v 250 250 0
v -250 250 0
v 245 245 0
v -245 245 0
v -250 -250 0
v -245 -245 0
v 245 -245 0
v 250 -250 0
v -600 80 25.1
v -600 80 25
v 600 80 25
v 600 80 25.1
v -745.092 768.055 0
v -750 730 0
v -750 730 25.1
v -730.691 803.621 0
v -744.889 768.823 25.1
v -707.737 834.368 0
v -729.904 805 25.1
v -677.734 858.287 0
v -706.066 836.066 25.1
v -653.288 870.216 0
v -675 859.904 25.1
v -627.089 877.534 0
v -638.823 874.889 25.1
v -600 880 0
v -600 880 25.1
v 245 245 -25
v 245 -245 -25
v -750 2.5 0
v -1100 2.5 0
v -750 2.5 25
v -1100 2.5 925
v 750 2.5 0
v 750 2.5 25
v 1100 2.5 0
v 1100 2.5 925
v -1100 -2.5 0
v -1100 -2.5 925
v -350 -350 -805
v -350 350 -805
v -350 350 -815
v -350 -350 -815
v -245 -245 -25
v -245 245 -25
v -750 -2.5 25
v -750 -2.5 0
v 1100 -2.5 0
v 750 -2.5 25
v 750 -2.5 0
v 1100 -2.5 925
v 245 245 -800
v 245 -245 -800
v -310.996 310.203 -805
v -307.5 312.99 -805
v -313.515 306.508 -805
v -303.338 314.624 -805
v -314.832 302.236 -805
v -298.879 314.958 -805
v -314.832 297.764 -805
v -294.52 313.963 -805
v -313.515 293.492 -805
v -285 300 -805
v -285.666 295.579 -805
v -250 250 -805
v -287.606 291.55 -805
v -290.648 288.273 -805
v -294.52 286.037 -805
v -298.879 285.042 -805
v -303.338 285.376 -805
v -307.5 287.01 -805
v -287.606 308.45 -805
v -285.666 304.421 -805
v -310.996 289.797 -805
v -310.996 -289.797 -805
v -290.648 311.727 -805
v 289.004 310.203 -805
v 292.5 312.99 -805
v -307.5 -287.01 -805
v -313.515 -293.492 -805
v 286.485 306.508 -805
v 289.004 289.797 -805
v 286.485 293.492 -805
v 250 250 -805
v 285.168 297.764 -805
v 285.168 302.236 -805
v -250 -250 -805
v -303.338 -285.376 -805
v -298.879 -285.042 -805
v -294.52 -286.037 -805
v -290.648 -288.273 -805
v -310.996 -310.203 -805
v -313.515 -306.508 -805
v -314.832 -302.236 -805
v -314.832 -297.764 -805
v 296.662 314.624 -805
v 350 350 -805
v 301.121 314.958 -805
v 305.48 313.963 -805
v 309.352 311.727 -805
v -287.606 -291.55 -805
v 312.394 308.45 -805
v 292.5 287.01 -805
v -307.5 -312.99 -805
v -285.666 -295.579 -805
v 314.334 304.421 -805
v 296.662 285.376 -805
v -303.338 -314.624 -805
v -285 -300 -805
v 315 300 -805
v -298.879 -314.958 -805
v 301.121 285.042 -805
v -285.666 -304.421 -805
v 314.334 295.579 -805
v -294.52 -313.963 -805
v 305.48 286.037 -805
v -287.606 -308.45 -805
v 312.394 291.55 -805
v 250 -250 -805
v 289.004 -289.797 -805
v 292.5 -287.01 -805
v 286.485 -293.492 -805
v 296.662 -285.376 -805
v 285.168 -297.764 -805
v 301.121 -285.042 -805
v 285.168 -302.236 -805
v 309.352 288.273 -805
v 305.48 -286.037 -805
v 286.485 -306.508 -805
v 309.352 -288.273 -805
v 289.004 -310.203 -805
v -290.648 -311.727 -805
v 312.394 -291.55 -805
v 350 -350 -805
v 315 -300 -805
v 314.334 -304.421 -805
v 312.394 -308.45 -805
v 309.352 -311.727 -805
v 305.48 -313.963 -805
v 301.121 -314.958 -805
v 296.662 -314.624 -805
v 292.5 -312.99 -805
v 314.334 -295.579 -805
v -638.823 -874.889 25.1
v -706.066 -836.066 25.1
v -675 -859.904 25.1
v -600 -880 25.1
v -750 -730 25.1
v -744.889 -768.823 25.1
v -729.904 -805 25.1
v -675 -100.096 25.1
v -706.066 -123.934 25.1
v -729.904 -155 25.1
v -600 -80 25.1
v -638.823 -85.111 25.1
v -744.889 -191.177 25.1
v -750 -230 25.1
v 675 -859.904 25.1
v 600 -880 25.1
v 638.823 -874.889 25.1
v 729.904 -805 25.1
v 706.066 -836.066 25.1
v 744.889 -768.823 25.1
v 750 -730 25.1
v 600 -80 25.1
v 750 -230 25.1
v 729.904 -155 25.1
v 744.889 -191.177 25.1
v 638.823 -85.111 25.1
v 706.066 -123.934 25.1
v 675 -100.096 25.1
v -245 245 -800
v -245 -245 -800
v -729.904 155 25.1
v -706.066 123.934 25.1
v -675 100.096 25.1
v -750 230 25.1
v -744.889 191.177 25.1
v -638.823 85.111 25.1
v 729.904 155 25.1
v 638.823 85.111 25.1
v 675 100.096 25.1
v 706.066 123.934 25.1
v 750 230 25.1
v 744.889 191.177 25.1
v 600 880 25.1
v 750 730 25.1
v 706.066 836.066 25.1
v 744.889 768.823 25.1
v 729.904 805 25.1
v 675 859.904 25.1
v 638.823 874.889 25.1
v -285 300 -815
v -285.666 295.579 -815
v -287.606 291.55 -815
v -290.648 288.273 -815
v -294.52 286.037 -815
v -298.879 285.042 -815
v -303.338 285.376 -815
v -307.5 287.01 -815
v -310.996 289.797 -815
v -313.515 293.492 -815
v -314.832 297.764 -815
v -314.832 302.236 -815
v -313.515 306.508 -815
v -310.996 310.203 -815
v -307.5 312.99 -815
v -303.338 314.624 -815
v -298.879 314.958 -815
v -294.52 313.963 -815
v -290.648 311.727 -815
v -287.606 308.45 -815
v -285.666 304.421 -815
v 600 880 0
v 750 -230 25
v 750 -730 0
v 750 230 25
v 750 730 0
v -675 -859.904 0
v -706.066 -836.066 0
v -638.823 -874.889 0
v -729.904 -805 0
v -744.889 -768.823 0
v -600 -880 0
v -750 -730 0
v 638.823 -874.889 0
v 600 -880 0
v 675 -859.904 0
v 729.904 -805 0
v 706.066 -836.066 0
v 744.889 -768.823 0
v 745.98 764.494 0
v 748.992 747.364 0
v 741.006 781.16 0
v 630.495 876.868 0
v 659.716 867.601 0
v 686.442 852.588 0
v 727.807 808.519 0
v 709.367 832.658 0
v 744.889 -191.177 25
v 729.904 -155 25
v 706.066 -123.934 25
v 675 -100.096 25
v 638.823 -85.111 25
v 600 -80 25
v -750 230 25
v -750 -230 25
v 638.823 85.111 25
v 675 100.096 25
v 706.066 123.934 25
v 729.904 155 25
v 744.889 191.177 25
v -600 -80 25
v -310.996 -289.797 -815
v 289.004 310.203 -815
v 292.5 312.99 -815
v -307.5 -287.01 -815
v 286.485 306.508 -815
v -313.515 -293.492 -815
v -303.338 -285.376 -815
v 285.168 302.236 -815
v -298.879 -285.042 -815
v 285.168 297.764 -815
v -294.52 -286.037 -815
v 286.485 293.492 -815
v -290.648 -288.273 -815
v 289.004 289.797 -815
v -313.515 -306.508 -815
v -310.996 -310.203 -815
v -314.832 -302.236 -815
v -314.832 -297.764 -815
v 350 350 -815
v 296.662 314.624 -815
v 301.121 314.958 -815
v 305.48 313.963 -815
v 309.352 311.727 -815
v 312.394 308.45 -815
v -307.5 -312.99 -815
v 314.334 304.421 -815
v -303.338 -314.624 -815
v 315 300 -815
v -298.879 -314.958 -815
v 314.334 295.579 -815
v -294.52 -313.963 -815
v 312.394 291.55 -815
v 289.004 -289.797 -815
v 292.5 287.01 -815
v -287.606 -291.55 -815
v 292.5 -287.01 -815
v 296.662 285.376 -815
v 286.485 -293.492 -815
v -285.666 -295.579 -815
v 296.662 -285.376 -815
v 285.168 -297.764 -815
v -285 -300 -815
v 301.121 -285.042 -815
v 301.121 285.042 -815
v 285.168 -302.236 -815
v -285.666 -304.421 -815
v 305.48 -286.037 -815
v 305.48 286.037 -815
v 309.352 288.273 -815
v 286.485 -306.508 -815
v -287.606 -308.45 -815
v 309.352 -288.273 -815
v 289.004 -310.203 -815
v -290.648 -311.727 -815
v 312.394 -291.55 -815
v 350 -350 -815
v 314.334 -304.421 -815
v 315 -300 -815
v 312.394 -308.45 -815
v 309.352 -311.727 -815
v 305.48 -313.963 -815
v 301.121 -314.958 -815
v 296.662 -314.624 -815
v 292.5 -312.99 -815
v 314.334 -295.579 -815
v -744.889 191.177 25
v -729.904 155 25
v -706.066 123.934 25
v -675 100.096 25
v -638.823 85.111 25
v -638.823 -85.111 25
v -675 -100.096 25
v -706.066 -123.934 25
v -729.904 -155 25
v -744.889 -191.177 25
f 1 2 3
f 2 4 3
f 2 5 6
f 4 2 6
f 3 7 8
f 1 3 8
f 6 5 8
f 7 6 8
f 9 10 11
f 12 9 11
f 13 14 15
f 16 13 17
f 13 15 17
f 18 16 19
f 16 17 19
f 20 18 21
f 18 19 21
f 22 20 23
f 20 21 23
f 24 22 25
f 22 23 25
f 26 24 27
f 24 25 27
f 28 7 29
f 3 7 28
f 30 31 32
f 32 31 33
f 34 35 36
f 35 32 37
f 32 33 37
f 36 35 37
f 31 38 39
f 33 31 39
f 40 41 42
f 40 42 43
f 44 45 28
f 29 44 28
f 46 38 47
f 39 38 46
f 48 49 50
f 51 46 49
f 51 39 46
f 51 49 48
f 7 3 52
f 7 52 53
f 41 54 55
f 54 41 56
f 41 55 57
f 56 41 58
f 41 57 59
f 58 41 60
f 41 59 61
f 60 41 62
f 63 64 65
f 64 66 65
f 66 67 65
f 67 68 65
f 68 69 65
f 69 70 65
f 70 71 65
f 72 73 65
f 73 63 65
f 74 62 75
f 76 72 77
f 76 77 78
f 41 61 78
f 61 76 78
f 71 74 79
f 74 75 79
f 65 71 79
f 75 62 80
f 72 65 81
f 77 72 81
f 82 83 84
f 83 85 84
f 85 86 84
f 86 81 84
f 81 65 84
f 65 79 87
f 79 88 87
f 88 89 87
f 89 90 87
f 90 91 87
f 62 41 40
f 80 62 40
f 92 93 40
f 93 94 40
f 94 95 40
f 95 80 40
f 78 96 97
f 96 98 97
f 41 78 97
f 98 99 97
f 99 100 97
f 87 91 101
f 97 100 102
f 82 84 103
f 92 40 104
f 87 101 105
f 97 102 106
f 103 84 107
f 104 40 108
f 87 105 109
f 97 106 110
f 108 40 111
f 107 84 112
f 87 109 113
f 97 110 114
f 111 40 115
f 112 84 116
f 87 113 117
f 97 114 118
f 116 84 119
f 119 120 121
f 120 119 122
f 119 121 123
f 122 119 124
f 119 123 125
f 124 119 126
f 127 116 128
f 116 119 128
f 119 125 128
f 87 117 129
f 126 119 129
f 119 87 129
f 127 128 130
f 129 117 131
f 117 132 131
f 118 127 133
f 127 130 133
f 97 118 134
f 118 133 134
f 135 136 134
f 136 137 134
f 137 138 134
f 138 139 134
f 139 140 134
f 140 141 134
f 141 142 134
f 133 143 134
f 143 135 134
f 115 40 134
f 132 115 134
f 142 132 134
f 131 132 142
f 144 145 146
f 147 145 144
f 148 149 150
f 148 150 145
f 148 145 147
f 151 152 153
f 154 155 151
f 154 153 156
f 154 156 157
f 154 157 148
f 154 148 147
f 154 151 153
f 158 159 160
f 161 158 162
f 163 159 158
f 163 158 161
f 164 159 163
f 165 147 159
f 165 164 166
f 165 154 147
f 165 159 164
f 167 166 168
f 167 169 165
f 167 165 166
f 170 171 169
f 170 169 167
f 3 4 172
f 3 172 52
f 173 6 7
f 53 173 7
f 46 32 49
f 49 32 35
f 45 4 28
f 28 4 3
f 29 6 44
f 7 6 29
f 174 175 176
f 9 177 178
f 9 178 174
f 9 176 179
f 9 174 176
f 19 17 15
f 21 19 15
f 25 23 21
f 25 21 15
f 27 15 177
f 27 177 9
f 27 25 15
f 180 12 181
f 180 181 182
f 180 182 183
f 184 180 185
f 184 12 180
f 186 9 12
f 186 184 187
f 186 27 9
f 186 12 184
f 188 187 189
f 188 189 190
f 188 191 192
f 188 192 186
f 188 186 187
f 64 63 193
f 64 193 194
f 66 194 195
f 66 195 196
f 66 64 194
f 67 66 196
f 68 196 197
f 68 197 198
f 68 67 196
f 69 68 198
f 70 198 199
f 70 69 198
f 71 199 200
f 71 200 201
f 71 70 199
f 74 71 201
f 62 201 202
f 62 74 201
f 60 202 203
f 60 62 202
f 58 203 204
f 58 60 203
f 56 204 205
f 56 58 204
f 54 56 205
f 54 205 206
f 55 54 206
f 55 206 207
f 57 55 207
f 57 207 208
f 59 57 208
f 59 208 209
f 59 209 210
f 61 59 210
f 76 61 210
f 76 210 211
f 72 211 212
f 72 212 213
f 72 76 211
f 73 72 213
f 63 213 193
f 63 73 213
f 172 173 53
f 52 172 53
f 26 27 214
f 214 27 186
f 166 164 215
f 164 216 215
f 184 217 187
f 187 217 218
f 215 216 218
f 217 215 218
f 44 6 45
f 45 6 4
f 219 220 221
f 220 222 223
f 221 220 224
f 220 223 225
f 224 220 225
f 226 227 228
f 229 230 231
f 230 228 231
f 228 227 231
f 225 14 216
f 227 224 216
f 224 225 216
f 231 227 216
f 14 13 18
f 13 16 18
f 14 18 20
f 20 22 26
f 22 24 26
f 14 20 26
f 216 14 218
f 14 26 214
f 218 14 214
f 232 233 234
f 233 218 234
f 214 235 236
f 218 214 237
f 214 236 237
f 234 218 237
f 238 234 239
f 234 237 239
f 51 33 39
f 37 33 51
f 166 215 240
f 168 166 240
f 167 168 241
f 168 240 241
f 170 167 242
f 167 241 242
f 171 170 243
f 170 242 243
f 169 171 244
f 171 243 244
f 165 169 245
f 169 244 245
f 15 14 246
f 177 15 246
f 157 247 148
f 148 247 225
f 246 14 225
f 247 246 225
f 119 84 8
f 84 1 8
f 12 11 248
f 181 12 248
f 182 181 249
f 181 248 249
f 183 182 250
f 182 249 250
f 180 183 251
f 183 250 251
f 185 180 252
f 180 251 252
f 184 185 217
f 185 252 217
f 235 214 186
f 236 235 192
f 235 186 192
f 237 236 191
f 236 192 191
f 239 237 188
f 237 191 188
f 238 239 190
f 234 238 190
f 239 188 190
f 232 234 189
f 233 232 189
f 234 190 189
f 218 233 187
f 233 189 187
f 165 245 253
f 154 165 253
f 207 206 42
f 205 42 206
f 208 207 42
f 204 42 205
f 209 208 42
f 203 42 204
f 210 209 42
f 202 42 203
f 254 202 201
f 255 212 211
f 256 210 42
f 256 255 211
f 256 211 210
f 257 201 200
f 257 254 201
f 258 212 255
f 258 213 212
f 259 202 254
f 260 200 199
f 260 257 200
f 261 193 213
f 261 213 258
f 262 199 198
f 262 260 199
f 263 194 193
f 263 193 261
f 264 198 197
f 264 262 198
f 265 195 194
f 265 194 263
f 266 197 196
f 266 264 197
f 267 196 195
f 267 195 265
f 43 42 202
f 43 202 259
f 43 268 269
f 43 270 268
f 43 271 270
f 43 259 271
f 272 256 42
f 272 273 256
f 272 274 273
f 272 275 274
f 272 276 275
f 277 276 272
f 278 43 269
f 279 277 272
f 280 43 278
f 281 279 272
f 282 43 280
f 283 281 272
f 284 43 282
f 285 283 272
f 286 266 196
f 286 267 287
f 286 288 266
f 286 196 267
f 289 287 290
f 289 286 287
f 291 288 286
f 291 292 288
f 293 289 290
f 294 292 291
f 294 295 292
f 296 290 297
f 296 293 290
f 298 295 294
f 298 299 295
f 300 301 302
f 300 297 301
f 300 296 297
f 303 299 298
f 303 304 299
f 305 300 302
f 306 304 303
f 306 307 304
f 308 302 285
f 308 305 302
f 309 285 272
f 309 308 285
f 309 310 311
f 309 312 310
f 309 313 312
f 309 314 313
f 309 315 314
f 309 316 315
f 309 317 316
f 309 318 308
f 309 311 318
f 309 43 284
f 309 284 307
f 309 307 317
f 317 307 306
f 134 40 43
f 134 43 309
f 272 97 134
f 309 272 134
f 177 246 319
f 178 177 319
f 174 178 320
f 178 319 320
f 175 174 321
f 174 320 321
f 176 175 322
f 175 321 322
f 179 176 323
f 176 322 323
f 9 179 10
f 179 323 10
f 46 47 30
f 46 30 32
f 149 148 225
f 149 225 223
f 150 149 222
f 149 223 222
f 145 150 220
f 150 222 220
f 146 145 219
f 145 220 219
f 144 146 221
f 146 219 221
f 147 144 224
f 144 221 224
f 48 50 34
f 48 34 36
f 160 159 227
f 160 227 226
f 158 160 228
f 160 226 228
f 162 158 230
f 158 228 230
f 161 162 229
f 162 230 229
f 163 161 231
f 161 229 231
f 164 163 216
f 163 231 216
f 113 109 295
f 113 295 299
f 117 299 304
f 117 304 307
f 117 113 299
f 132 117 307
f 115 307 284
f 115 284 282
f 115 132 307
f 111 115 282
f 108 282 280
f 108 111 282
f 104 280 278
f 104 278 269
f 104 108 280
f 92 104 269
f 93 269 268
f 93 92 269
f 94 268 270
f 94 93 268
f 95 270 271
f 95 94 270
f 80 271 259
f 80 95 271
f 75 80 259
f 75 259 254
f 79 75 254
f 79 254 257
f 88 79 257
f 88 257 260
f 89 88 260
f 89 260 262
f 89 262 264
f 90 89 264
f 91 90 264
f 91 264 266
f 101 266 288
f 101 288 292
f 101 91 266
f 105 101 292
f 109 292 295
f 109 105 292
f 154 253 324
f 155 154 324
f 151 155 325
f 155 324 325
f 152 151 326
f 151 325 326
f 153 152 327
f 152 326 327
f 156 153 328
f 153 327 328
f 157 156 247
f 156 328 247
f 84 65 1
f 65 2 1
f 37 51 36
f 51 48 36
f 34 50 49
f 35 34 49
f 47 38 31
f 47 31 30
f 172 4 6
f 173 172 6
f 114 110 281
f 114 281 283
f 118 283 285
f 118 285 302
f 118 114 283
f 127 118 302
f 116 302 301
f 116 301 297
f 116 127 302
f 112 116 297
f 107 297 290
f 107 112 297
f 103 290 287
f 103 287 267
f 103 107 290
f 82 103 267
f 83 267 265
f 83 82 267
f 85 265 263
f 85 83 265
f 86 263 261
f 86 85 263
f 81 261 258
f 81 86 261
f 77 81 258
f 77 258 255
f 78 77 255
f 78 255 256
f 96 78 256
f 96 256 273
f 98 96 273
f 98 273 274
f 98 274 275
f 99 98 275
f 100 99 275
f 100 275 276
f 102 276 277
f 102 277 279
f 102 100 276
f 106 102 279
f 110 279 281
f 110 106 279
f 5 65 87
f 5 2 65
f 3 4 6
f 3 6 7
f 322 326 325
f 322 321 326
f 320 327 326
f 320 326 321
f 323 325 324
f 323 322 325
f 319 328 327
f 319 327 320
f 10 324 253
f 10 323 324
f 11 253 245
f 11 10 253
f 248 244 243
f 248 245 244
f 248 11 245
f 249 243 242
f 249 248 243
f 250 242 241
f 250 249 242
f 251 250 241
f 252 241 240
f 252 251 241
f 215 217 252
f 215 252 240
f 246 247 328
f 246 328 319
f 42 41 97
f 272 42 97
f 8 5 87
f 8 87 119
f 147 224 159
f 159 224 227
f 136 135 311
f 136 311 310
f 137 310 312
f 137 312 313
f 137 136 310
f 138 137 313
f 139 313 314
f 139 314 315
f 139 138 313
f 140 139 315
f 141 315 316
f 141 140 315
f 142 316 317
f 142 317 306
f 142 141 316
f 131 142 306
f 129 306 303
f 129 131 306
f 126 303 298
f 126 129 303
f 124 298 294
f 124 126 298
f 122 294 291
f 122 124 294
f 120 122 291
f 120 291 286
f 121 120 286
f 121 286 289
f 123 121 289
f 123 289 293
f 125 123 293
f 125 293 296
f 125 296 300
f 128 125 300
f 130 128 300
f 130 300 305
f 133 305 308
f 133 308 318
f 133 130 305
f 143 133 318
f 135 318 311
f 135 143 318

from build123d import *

# Parameters (mm, degrees)
F0_R      = 1250
F1_DEPTH  = 25
F3_DEPTH  = 0.1
F4_W      = 500
F4_H      = 500
F4_W_2    = 490
F4_H_2    = 490
F5_DEPTH  = 800
F6_W      = 2200
F6_H      = 5
F7_DEPTH  = 900
F8_W      = 500
F8_H      = 500
F9_DEPTH  = 5
F10_W     = 700
F10_H     = 700
F10_R     = 15
F11_DEPTH = 10
F13_DEPTH = 30
F15_DEPTH = 30
F16_W     = 490
F16_H     = 490
F17_DEPTH = 25
F18_R     = 350
F20_DEPTH = 25
F21_W     = 350
F21_H     = 25
F22_DEPTH = 5


# Not quite as in the source:
# - a feature names something its author has since deleted; it is built from what else it names


with BuildPart() as f1:
    # F0 (on Top) → F1 (new body)
    with BuildSketch(Plane.XY):
        Circle(F0_R)
    extrude(amount=F1_DEPTH)

    # F2 (on face) → F3 (join)
    with BuildSketch(Plane.XY.offset(25)):
        with BuildLine():
            Line((-600, 80), (600, 80))
            ThreePointArc((600, 80), (706.066017178, 123.933982822), (750, 230))
            Line((750, 230), (750, 730))
            ThreePointArc((750, 730), (706.066017178, 836.066017178), (600, 880))
            Line((600, 880), (-600, 880))
            ThreePointArc((-600, 880), (-706.066017178, 836.066017178), (-750, 730))
            Line((-750, 730), (-750, 230))
            ThreePointArc((-750, 230), (-706.066017178, 123.933982822), (-600, 80))
        make_face()
        with BuildLine():
            ThreePointArc((-600, -80), (-706.066017178, -123.933982822), (-750, -230))
            Line((-750, -230), (-750, -730))
            ThreePointArc((-750, -730), (-706.066017178, -836.066017178), (-600, -880))
            Line((-600, -880), (600, -880))
            ThreePointArc((600, -880), (706.066017178, -836.066017178), (750, -730))
            Line((750, -730), (750, -230))
            ThreePointArc((750, -230), (706.066017178, -123.933982822), (600, -80))
            Line((600, -80), (-600, -80))
        make_face()
    extrude(amount=F3_DEPTH)

    # F12 (on face) → F13 (cut)
    with BuildSketch(Plane.XY.offset(25)):
        with BuildLine():
            ThreePointArc((835.2245207129, -930), (0, -1250), (-835.2245207129, -930))
            Line((-835.2245207129, -930), (-1254.9974999975, -930))
            Line((-1254.9974999975, -930), (-1254.9974999975, -1430))
            Line((-1254.9974999975, -1430), (1245.0025000025, -1430))
            Line((1245.0025000025, -1430), (1245.0025000025, -930))
            Line((1245.0025000025, -930), (835.2245207129, -930))
        make_face()
        with BuildLine():
            Line((-835.2245207129, 930), (835.2245207129, 930))
            ThreePointArc((835.2245207129, 930), (0, 1250), (-835.2245207129, 930))
        make_face()
        with BuildLine():
            Line((835.2245207129, -930), (-835.2245207129, -930))
            ThreePointArc((-835.2245207129, -930), (0, -1250), (835.2245207129, -930))
        make_face()
    extrude(amount=-F13_DEPTH, mode=Mode.SUBTRACT)

    # F14 (on face) → F15 (cut)
    with BuildSketch(Plane.XY.offset(25)):
        Polygon((835.2245207128, 930), (835.2245207128, -930), (1324.2889336484, -826), (1324.2889336484, 930), align=None)
        Polygon((-1324.2889336484, -826), (-835.2245207128, -930), (-835.2245207128, 930), (-1324.2889336484, 930), align=None)
    extrude(amount=-F15_DEPTH, mode=Mode.SUBTRACT)

    # F18
    f18_edges = [f1.edges().sort_by_distance(p)[0] for p in [
        (-835.224521, 930, 12.5),
        (-835.224521, -930, 12.5),
        (835.224521, -930, 12.5),
        (835.224521, 930, 12.5),
    ]]
    fillet(f18_edges, radius=F18_R)

    # F19 (on face) → F20 (cut)
    with BuildSketch(Plane.XY.offset(25)):
        with BuildLine():
            Line((-750, 230), (-750, 730))
            ThreePointArc((-750, 730), (-730.6905446057, 803.6205239771), (-677.7335793245, 858.2867516363))
            Line((-677.7335793245, 858.2867516363), (-665.502084486, 880))
            ThreePointArc((-665.502084486, 880), (-789.8531038437, 752.3410175776), (-835.2245207128, 580))
            Line((-835.2245207128, 580), (-835.2245207128, -580))
            ThreePointArc((-835.2245207128, -580), (-813.2271256953, -702.1240808553), (-750, -808.8972380092))
            Line((-750, -808.8972380092), (-750, -730))
            Line((-750, -730), (-750, -230))
            Line((-750, -230), (-750, 230))
        make_face()
        with BuildLine():
            Line((-665.502084486, 880), (-677.7335793245, 858.2867516363))
            ThreePointArc((-677.7335793245, 858.2867516363), (-640.3545985889, 874.4697420664), (-600, 880))
            Line((-600, 880), (-665.502084486, 880))
        make_face()
        with BuildLine():
            ThreePointArc((-485.2245207128, 930), (-578.7659553822, 917.2684390808), (-665.502084486, 880))
            Line((-665.502084486, 880), (-600, 880))
            Line((-600, 880), (600, 880))
            Line((600, 880), (665.502084486, 880))
            ThreePointArc((665.502084486, 880), (578.7659553822, 917.2684390808), (485.2245207128, 930))
            Line((485.2245207128, 930), (-485.2245207128, 930))
        make_face()
        with BuildLine():
            ThreePointArc((-600, -880), (-706.066017178, -836.066017178), (-750, -730))
            Line((-750, -730), (-750, -808.8972380092))
            ThreePointArc((-750, -808.8972380092), (-710.5730362948, -847.8022526511), (-665.5020844861, -880))
            Line((-665.5020844861, -880), (-600, -880))
        make_face()
        with BuildLine():
            Line((665.502084486, 880), (600, 880))
            ThreePointArc((600, 880), (645.3424208849, 872.9827432535), (686.4424496518, 852.5875315772))
            Line((686.4424496518, 852.5875315772), (665.502084486, 880))
        make_face()
        with BuildLine():
            Line((600, -880), (-600, -880))
            Line((-600, -880), (-665.5020844861, -880))
            ThreePointArc((-665.5020844861, -880), (-578.7659553822, -917.2684390808), (-485.2245207128, -930))
            Line((-485.2245207128, -930), (485.2245207128, -930))
            ThreePointArc((485.2245207128, -930), (578.7659553822, -917.2684390808), (665.5020844861, -880))
            Line((665.5020844861, -880), (600, -880))
        make_face()
        with BuildLine():
            Line((750, 730), (750, 230))
            Line((750, 230), (750, -230))
            Line((750, -230), (750, -730))
            Line((750, -730), (750, -808.8972380092))
            ThreePointArc((750, -808.8972380092), (813.2271256953, -702.1240808553), (835.2245207128, -580))
            Line((835.2245207128, -580), (835.2245207128, 580))
            ThreePointArc((835.2245207128, 580), (789.8531038437, 752.3410175776), (665.502084486, 880))
            Line((665.502084486, 880), (686.4424496518, 852.5875315772))
            ThreePointArc((686.4424496518, 852.5875315772), (719.2000530228, 821.0568358739), (741.0058450449, 781.1600592569))
            Line((741.0058450449, 781.1600592569), (750, 769.3860530853))
            Line((750, 769.3860530853), (750, 730))
        make_face()
        with BuildLine():
            ThreePointArc((750, -730), (706.066017178, -836.066017178), (600, -880))
            Line((600, -880), (665.5020844861, -880))
            ThreePointArc((665.5020844861, -880), (710.5730362948, -847.8022526511), (750, -808.8972380092))
            Line((750, -808.8972380092), (750, -730))
        make_face()
        with BuildLine():
            ThreePointArc((741.0058450449, 781.1600592569), (747.7343507055, 755.9723241476), (750, 730))
            Line((750, 730), (750, 769.3860530853))
            Line((750, 769.3860530853), (741.0058450449, 781.1600592569))
        make_face()
    extrude(amount=-F20_DEPTH, mode=Mode.SUBTRACT)


with BuildPart() as f5:
    # F4 (on face) → F5 (new body)
    with BuildSketch(Plane(origin=(0, 0, 0), x_dir=(1, 0, 0), z_dir=(0, 0, -1))):
        Rectangle(F4_W, F4_H)
        Rectangle(F4_W_2, F4_H_2, mode=Mode.SUBTRACT)
    extrude(amount=F5_DEPTH)

    # F8 (on face) → F9 (join)
    with BuildSketch(Plane(origin=(0, 0, -800), x_dir=(1, 0, 0), z_dir=(0, 0, -1))):
        Rectangle(F8_W, F8_H)
    extrude(amount=F9_DEPTH)

    # F10 (on face) → F11 (join)
    with BuildSketch(Plane(origin=(0, 0, -805), x_dir=(1, 0, 0), z_dir=(0, 0, -1))):
        Rectangle(F10_W, F10_H)
        with Locations((-300, -300)):
            Circle(F10_R, mode=Mode.SUBTRACT)
        with Locations((300, -300)):
            Circle(F10_R, mode=Mode.SUBTRACT)
        with Locations((-300, 300)):
            Circle(F10_R, mode=Mode.SUBTRACT)
        with Locations((300, 300)):
            Circle(F10_R, mode=Mode.SUBTRACT)
    extrude(amount=F11_DEPTH)


with BuildPart() as f7:
    # F6 (on face) → F7 (new body)
    with BuildSketch(Plane.XY.offset(25)):
        Rectangle(F6_W, F6_H)
    extrude(amount=F7_DEPTH)

    # F21 (on face) → F22 (join)
    with BuildSketch(Plane.XZ.offset(2.5)):
        with Locations((-925, 12.5)):
            Rectangle(F21_W, F21_H)
        with Locations((925, 12.5)):
            Rectangle(F21_W, F21_H)
    extrude(amount=-F22_DEPTH)


with BuildPart() as f17:
    # F16 (on face) → F17 (new body)
    with BuildSketch(Plane.XY):
        Rectangle(F16_W, F16_H)
    extrude(amount=-F17_DEPTH)


solid = Compound([f1.part, f5.part, f7.part, f17.part])
